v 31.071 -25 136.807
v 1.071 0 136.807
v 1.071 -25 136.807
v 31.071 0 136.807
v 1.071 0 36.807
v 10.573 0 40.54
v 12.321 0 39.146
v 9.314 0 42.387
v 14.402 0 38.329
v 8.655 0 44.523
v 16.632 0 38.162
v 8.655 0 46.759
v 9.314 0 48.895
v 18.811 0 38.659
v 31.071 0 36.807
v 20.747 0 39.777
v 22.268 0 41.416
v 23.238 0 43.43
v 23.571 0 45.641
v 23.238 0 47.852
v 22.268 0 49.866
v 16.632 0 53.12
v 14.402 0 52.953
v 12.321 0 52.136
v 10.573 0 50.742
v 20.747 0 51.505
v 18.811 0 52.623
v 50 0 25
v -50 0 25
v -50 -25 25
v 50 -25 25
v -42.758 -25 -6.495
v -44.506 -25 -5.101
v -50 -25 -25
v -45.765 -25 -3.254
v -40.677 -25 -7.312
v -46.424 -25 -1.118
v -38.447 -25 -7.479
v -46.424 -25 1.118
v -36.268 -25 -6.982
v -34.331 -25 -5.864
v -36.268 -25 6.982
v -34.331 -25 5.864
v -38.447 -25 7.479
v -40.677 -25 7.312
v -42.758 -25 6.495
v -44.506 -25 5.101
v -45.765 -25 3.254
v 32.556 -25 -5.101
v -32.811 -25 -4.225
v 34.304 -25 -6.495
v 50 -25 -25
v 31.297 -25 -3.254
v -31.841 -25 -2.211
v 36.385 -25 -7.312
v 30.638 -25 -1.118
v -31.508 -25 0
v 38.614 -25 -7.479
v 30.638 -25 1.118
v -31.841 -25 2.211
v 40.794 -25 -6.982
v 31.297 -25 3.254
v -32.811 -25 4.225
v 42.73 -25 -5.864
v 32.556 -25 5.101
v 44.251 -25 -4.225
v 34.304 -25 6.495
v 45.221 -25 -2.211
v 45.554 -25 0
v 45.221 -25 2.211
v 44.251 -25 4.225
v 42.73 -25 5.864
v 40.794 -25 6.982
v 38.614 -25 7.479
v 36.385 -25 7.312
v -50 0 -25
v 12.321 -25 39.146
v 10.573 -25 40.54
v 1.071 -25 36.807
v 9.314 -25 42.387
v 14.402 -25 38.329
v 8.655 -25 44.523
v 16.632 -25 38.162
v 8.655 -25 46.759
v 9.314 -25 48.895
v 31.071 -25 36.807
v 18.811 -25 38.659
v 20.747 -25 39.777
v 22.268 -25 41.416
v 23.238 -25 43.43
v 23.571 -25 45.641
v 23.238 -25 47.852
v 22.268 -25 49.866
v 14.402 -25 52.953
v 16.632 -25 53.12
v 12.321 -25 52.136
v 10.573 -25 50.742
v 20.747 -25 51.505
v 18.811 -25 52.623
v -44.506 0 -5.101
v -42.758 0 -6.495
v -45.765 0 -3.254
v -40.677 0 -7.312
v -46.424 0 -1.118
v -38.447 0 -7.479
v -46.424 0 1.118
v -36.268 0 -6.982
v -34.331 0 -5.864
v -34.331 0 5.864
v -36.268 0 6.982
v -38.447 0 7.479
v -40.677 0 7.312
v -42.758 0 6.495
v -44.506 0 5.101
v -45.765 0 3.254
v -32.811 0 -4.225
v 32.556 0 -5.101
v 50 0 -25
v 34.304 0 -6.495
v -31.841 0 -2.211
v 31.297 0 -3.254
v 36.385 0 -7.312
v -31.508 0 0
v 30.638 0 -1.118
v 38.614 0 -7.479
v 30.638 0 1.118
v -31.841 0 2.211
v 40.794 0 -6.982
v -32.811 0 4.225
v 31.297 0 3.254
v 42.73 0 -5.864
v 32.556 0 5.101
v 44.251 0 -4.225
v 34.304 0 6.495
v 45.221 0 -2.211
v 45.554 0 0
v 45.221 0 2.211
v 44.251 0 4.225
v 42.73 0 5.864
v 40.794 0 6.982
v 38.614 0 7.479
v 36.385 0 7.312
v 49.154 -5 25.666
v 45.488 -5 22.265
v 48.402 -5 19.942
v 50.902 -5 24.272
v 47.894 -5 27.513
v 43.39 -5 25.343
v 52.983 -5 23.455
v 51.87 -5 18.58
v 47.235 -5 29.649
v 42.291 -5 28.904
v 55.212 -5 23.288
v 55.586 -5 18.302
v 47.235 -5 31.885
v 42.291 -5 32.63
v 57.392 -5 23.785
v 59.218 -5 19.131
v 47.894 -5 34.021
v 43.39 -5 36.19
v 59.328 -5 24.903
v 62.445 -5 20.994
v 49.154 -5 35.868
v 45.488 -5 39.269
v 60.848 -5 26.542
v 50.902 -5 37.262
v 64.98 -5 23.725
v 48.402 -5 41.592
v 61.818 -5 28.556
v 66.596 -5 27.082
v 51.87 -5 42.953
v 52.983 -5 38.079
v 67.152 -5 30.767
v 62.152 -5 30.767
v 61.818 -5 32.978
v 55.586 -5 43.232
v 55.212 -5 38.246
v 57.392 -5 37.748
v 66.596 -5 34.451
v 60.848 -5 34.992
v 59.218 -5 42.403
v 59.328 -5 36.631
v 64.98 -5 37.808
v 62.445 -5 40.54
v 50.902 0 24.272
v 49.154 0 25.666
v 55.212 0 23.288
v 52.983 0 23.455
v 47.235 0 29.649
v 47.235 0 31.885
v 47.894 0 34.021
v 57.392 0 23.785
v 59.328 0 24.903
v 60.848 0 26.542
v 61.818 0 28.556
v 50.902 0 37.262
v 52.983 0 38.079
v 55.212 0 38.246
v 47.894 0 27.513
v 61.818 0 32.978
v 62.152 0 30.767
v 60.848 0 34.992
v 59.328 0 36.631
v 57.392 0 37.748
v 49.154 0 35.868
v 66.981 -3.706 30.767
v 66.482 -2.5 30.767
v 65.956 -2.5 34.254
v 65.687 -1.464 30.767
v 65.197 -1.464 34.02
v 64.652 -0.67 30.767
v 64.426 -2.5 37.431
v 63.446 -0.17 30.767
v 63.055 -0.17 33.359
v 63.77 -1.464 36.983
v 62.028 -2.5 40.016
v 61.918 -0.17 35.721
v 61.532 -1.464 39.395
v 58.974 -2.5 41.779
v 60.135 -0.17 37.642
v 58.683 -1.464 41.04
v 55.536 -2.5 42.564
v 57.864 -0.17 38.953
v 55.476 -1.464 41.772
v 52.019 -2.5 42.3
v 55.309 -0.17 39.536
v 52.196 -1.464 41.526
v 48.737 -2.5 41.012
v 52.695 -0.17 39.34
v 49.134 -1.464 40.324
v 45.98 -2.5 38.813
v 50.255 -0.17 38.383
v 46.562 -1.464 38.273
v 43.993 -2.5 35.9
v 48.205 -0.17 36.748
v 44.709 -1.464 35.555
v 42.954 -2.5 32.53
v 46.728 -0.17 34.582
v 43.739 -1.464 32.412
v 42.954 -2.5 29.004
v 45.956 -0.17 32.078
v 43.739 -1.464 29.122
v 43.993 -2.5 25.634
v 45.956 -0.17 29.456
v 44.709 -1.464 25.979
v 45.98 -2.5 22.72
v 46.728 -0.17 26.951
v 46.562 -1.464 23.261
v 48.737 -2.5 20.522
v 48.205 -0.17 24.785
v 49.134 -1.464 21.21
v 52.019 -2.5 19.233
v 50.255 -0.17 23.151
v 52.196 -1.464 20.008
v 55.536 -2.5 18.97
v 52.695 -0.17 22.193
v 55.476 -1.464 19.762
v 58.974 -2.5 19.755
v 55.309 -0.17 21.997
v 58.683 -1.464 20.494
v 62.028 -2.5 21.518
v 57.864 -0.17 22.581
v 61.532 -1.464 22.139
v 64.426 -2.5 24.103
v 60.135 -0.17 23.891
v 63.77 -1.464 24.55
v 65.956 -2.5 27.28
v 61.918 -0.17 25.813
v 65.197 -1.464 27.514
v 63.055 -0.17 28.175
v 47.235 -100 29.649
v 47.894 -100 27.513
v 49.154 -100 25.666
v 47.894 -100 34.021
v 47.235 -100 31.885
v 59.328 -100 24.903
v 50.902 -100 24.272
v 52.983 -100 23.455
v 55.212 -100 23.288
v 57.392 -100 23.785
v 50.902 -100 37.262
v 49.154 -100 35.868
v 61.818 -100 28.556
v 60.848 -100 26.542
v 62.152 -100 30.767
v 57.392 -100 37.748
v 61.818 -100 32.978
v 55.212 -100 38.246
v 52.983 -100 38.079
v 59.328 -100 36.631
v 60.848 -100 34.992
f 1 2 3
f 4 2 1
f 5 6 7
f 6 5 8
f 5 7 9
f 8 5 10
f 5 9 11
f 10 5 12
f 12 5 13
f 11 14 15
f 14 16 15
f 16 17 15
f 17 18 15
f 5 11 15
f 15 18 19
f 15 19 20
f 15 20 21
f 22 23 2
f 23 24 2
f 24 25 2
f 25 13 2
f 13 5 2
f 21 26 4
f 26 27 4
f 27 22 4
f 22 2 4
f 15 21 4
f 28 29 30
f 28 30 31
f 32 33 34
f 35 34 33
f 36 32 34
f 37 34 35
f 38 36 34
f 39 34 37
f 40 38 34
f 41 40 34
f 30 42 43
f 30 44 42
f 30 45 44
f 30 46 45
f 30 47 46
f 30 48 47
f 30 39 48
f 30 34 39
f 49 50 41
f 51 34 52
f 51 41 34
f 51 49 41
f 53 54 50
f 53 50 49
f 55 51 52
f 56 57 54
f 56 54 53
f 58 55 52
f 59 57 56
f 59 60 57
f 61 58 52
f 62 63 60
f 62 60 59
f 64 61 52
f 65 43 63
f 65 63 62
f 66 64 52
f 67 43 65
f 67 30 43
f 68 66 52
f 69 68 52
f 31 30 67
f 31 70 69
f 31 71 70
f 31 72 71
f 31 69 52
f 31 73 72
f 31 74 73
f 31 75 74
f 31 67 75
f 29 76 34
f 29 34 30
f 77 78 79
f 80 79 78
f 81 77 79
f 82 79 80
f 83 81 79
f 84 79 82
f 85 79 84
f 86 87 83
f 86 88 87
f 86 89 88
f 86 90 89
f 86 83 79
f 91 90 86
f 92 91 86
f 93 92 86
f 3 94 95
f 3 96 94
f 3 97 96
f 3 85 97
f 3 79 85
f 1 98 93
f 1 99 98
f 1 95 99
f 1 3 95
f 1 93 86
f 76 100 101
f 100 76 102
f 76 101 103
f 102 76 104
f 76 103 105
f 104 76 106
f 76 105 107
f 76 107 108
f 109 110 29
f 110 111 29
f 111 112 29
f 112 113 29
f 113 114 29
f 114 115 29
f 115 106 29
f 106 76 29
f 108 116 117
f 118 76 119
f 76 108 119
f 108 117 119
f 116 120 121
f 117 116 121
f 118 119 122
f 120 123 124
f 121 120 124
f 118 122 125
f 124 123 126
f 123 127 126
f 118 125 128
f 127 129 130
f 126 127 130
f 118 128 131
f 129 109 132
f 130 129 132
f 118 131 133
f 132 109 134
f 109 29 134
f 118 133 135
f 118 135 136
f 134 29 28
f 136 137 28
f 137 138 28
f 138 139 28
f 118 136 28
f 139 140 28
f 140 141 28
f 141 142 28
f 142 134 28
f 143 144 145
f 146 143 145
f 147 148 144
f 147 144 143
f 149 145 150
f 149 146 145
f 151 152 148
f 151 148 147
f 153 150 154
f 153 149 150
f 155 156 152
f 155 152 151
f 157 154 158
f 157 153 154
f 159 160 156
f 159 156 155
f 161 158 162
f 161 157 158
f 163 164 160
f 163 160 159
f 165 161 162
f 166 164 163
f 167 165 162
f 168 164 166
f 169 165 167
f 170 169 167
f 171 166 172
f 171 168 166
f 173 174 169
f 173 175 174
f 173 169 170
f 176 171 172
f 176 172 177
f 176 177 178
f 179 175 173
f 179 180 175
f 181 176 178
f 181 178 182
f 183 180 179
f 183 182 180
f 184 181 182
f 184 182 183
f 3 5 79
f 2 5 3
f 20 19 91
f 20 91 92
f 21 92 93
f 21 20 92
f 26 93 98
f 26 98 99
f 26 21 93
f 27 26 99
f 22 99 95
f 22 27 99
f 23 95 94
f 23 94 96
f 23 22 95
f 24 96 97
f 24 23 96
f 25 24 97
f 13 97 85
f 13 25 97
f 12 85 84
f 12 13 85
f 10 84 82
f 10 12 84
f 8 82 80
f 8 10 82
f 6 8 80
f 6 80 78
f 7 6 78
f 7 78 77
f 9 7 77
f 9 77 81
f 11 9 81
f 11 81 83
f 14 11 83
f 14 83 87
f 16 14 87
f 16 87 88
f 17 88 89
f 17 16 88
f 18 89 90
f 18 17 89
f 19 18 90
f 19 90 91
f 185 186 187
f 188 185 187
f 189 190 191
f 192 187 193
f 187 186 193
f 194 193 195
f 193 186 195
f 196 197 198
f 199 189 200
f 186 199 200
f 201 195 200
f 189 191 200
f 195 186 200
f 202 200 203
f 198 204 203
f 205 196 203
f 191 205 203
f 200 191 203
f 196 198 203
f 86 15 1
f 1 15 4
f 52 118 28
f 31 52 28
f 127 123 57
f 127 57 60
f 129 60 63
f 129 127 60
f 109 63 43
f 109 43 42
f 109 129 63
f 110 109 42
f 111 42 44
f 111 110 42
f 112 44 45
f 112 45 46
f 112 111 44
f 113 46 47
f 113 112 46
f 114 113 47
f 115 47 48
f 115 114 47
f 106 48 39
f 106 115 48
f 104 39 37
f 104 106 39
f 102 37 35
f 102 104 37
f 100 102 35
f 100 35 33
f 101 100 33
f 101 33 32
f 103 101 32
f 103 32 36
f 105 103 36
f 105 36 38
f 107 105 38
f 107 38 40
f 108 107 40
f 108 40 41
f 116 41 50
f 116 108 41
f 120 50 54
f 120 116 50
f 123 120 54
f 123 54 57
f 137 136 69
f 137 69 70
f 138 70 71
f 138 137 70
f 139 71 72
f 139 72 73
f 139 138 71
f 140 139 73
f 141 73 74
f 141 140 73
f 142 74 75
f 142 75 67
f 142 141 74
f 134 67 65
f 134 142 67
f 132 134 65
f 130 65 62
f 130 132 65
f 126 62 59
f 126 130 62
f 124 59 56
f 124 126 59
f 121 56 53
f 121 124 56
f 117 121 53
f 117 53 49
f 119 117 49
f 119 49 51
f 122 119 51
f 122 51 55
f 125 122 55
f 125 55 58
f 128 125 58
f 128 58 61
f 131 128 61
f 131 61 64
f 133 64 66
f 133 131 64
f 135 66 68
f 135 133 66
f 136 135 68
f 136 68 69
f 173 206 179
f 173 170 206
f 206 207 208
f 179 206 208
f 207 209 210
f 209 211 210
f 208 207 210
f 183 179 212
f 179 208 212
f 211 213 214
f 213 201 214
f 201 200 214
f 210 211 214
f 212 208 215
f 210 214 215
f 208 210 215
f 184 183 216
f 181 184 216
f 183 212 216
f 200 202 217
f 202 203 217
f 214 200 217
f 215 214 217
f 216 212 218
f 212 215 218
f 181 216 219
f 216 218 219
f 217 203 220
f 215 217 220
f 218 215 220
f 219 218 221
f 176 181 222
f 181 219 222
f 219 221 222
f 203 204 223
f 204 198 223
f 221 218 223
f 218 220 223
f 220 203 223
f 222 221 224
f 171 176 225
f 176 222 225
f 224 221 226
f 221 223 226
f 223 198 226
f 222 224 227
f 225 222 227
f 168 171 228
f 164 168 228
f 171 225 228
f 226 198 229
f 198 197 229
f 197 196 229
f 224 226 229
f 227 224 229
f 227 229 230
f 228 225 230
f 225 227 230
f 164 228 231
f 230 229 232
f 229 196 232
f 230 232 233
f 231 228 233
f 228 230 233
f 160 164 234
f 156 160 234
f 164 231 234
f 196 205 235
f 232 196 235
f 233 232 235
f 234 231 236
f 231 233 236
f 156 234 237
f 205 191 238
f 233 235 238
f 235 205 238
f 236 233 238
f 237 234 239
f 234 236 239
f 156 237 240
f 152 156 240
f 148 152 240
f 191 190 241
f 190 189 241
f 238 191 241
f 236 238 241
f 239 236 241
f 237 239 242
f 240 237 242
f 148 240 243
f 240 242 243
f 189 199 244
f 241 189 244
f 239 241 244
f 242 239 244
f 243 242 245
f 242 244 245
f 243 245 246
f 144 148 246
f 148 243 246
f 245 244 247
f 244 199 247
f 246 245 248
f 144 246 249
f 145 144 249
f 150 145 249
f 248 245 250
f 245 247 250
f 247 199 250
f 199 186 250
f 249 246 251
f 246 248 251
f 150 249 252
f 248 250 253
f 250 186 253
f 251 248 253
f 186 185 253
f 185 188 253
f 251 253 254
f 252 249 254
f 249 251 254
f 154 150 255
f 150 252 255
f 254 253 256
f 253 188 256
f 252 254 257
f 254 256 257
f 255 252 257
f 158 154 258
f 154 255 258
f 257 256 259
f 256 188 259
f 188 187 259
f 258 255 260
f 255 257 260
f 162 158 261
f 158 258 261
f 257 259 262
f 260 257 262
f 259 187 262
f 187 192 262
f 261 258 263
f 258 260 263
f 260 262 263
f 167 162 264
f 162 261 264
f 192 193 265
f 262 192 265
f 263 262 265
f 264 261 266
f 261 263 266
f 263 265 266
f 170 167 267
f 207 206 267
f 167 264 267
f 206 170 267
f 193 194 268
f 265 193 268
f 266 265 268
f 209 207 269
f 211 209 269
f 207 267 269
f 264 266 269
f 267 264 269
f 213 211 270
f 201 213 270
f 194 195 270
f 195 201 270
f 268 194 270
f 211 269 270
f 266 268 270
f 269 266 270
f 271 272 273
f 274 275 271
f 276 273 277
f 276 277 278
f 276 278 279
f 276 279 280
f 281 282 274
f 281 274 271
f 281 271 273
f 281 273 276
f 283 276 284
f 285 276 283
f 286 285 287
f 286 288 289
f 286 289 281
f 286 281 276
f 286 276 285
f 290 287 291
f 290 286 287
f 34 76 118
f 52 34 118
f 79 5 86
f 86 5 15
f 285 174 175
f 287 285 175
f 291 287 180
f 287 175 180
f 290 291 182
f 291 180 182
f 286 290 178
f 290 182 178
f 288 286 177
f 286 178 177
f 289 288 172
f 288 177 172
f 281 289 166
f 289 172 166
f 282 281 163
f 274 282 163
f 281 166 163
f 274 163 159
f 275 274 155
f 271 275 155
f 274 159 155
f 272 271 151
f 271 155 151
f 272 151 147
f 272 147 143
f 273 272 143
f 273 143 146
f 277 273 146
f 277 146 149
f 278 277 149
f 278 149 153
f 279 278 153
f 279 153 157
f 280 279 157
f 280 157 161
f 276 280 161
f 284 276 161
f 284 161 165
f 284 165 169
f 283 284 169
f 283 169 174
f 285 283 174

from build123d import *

# Parameters (mm, degrees)
F0_W     = 100
F0_H     = 50
F0_R     = 7.5
F1_DEPTH = 25
F2_W     = 30
F2_H     = 100
F2_R     = 7.5
F3_DEPTH = 25
F4_R     = 7.5
F5_DEPTH = 100
F6_R     = 12.5
F7_DEPTH = 5
F8_R     = 4.99999


# Not quite as in the source:
# - a fillet or chamfer is up to 0.001 mm smaller than in the source, because OpenCascade refuses the exact size


with BuildPart() as f1:
    # F0 (on Front) → F1 (new body)
    with BuildSketch(Plane.XZ):
        Rectangle(F0_W, F0_H)
        with Locations((-39.0076674521, 0)):
            Circle(F0_R, mode=Mode.SUBTRACT)
        with Locations((38.0539149046, 0)):
            Circle(F0_R, mode=Mode.SUBTRACT)
    extrude(amount=F1_DEPTH)


with BuildPart() as f3:
    # F2 (on Front) → F3 (new body)
    with BuildSketch(Plane.XZ):
        with Locations((16.0711699724, 86.8074811995)):
            Rectangle(F2_W, F2_H)
        with Locations((16.0711699724, 45.6409826875)):
            Circle(F2_R, mode=Mode.SUBTRACT)
    extrude(amount=F3_DEPTH)


with BuildPart() as f5:
    # F4 (on Front) → F5 (new body)
    with BuildSketch(Plane.XZ):
        with Locations((54.6516440809, 30.7668615133)):
            Circle(F4_R)
    extrude(amount=F5_DEPTH)

    # F6 (on Front) → F7 (join)
    with BuildSketch(Plane.XZ):
        with Locations((54.6516440809, 30.7668615133)):
            Circle(F6_R)
    extrude(amount=F7_DEPTH)

    # F8 (radius 5 in the source; OpenCascade refuses exactly that, so slightly less here)
    f8_edges = [f5.edges().sort_by_distance(p)[0] for p in [
        (42.151644, 0, 30.766862),
    ]]
    fillet(f8_edges, radius=F8_R)


solid = Compound([f1.part, f3.part, f5.part])
